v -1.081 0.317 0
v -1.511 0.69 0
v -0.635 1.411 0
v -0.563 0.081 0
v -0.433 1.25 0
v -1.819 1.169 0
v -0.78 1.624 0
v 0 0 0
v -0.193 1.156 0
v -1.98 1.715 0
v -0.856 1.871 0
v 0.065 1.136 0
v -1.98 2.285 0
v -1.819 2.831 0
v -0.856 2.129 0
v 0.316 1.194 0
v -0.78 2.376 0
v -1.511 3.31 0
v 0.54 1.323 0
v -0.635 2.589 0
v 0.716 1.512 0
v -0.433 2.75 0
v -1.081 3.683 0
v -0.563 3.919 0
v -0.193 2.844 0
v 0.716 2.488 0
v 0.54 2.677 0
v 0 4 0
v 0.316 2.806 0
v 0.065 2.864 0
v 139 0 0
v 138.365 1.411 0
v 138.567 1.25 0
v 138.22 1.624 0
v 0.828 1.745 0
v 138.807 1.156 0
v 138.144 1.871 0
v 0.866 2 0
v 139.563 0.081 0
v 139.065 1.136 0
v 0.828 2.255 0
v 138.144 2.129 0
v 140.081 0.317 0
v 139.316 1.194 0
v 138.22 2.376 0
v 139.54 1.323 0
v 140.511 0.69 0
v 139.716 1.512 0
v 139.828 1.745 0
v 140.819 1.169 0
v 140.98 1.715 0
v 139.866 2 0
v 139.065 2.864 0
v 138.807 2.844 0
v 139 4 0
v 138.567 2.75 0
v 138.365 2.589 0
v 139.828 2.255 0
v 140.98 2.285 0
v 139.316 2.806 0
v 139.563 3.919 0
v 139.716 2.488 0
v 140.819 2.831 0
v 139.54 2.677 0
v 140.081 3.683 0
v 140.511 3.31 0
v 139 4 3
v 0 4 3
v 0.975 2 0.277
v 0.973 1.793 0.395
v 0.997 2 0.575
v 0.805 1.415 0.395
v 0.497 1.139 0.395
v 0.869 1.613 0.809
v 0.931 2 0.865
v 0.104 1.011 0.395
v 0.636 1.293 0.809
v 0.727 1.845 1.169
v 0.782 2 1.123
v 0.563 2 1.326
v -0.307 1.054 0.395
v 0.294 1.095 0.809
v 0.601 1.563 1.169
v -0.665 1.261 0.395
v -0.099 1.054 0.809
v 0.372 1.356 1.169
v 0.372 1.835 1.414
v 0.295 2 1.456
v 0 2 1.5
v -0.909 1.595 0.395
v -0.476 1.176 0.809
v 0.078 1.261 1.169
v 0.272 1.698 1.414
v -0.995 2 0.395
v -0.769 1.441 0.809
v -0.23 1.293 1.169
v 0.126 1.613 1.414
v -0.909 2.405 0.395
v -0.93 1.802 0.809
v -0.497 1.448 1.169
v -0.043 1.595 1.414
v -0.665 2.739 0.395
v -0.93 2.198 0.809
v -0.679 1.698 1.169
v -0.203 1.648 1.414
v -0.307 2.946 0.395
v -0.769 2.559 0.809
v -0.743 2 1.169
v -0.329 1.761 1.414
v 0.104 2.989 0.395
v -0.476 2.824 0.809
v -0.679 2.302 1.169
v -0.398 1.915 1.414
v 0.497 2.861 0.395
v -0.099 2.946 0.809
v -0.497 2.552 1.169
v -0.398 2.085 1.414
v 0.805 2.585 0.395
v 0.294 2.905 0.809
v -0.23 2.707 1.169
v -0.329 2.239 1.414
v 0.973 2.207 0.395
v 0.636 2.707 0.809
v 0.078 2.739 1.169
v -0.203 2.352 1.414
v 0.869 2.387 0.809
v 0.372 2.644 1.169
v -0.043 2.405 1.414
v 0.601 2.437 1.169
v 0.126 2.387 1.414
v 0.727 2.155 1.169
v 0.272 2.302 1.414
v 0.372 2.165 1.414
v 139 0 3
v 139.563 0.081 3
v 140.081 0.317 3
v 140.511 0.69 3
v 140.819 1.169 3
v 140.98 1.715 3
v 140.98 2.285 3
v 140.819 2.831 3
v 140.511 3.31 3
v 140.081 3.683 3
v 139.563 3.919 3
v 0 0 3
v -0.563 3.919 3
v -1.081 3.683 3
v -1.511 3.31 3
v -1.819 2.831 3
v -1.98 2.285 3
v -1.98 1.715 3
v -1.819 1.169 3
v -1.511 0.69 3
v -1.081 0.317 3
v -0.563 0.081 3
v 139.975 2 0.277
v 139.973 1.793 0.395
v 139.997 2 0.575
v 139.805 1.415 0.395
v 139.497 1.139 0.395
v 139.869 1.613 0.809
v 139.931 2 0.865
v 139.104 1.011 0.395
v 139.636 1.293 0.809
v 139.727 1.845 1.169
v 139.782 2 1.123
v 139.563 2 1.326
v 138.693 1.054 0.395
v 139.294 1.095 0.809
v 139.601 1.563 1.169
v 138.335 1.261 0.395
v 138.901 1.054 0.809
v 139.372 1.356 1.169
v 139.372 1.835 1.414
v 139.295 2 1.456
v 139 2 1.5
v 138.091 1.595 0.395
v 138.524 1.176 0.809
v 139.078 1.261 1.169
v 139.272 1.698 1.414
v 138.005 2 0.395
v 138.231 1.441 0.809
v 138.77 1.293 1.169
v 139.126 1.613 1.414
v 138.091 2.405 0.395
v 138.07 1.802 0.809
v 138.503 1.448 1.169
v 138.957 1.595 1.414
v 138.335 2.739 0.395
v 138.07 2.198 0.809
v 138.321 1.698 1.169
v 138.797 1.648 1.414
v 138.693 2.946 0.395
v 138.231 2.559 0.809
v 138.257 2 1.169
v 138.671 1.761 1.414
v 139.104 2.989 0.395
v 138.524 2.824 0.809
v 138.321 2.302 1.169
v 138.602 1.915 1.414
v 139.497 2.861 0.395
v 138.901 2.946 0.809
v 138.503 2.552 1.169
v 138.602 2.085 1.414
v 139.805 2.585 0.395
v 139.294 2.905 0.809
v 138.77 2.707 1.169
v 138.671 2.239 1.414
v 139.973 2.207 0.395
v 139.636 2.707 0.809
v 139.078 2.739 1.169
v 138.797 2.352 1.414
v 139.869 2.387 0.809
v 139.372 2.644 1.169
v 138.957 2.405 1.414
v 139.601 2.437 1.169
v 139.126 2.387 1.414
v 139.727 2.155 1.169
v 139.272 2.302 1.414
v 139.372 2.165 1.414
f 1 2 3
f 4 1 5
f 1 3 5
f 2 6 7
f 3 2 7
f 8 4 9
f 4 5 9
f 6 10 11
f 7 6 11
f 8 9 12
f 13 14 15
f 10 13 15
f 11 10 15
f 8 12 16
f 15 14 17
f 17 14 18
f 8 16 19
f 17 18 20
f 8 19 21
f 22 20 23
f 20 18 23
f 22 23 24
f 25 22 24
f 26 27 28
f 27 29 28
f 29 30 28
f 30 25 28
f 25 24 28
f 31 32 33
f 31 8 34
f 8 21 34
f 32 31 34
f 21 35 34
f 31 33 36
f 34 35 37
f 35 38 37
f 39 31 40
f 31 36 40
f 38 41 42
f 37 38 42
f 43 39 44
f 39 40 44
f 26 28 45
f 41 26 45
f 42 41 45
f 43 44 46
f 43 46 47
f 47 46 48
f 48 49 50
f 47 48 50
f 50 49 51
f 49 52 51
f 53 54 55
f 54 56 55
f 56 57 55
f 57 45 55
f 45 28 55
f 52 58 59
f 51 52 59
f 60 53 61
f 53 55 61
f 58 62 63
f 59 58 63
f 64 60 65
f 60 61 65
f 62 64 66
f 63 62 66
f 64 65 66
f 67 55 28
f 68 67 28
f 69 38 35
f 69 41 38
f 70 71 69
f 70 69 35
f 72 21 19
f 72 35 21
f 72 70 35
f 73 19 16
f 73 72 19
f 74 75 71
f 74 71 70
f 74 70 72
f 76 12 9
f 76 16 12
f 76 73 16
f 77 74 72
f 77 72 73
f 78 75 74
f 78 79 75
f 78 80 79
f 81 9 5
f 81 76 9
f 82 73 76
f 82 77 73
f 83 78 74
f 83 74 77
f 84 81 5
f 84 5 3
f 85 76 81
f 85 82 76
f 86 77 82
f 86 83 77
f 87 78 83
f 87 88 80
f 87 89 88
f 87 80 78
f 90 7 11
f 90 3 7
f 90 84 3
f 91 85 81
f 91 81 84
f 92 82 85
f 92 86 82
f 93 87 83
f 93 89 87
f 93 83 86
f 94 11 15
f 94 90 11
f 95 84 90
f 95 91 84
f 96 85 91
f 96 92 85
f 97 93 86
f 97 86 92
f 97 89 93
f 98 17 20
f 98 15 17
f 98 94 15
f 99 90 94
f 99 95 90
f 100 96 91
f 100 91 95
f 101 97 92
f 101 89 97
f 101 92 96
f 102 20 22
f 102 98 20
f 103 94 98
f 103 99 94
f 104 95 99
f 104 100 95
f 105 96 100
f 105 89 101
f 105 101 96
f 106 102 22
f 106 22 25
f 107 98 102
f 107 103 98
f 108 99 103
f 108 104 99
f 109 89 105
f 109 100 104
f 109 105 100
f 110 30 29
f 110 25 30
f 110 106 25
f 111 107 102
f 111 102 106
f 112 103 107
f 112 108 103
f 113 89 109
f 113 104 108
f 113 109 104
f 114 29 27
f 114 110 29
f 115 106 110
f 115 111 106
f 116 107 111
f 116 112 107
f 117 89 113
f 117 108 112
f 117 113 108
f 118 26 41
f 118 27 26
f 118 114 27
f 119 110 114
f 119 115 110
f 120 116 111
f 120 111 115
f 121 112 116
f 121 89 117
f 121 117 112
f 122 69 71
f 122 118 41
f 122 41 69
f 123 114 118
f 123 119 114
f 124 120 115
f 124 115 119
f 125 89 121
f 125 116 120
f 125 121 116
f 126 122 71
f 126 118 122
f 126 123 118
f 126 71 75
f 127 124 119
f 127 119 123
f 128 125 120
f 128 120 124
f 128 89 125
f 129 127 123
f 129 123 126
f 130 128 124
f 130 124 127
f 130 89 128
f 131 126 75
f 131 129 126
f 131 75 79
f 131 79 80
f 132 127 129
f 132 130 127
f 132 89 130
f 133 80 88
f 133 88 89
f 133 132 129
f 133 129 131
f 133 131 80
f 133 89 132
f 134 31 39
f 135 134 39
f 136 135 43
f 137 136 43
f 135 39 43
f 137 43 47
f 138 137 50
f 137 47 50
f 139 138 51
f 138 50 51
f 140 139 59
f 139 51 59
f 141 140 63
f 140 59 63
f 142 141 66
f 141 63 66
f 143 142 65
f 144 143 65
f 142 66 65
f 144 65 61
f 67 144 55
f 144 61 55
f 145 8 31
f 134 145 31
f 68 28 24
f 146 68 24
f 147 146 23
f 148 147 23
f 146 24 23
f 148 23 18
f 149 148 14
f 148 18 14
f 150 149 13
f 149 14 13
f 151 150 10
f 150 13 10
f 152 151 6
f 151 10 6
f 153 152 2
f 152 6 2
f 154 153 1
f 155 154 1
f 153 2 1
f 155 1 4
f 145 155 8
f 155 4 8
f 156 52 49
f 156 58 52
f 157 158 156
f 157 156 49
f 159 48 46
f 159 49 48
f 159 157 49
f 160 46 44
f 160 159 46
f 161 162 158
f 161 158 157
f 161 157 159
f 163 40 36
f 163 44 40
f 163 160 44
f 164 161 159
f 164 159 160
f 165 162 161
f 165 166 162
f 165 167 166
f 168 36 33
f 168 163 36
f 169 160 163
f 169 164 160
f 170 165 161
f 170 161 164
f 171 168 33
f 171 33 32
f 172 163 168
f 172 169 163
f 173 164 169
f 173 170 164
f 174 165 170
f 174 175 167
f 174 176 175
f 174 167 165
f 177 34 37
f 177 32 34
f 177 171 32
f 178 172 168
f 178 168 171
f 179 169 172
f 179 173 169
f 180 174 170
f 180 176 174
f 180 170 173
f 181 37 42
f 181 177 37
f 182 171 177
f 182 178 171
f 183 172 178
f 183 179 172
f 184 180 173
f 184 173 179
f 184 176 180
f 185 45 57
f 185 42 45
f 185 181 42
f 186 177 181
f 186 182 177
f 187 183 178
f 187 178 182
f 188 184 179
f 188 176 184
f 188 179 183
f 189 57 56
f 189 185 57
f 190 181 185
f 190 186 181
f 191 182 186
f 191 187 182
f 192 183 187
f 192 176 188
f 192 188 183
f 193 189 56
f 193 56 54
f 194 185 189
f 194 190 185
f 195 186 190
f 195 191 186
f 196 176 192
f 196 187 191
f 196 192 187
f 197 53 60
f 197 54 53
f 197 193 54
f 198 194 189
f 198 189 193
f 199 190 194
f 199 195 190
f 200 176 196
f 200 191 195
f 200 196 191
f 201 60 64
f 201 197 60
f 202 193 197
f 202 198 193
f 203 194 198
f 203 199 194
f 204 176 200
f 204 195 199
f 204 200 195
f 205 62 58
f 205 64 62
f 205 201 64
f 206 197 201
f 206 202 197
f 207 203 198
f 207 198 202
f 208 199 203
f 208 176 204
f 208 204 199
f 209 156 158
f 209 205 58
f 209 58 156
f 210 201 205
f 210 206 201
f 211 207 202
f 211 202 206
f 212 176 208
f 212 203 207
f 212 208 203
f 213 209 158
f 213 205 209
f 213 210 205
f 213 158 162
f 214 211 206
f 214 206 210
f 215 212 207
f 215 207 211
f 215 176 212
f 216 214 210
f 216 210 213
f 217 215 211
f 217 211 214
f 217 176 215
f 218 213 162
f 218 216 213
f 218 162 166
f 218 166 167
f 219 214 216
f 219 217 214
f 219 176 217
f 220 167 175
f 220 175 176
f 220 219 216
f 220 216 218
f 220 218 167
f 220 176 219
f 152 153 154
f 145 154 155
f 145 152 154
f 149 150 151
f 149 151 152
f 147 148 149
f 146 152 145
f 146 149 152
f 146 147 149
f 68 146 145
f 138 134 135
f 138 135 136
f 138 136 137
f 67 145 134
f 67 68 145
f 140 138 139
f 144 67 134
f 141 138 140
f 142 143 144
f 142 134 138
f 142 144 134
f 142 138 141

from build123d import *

# Parameters (mm, degrees)
EXTRUDE_1_DEPTH = 3


with BuildPart() as part:
    # 草图1 → 凸台-拉伸1 (new body)
    with BuildSketch(Plane.XY):
        with BuildLine():
            Line((0, 0), (139, 0))
            ThreePointArc((139, 0), (141, 2), (139, 4))
            Line((139, 4), (0, 4))
            ThreePointArc((0, 4), (-2, 2), (0, 0))
        make_face()
    extrude(amount=EXTRUDE_1_DEPTH)

    # 草图2 → 切除-旋转1 (revolve, cut)
    with BuildSketch(Plane(origin=(0, 2, 0), x_dir=(-1, 0, 0), z_dir=(0, -1, 0))):
        with BuildLine():
            Line((0, -0.5), (0, 0))
            Line((0, 0), (0, 0.5))
            ThreePointArc((0, 0.5), (-1, -0.5), (0, -1.5))
            Line((0, -1.5), (0, -0.5))
        make_face()
    revolve(axis=Axis((0, 2, 0), (0, 0, -1)), mode=Mode.SUBTRACT)

    # 草图4 → 切除-旋转3 (revolve, cut)
    with BuildSketch(Plane(origin=(0, 2, 0), x_dir=(-1, 0, 0), z_dir=(0, -1, 0))):
        with BuildLine():
            Line((-139, -0.5), (-139, 0))
            Line((-139, 0), (-139, 0.5))
            ThreePointArc((-139, 0.5), (-140, -0.5), (-139, -1.5))
            Line((-139, -1.5), (-139, -0.5))
        make_face()
    revolve(axis=Axis((139, 2, 1.5), (0, 0, -1)), mode=Mode.SUBTRACT)


solid = part.part
